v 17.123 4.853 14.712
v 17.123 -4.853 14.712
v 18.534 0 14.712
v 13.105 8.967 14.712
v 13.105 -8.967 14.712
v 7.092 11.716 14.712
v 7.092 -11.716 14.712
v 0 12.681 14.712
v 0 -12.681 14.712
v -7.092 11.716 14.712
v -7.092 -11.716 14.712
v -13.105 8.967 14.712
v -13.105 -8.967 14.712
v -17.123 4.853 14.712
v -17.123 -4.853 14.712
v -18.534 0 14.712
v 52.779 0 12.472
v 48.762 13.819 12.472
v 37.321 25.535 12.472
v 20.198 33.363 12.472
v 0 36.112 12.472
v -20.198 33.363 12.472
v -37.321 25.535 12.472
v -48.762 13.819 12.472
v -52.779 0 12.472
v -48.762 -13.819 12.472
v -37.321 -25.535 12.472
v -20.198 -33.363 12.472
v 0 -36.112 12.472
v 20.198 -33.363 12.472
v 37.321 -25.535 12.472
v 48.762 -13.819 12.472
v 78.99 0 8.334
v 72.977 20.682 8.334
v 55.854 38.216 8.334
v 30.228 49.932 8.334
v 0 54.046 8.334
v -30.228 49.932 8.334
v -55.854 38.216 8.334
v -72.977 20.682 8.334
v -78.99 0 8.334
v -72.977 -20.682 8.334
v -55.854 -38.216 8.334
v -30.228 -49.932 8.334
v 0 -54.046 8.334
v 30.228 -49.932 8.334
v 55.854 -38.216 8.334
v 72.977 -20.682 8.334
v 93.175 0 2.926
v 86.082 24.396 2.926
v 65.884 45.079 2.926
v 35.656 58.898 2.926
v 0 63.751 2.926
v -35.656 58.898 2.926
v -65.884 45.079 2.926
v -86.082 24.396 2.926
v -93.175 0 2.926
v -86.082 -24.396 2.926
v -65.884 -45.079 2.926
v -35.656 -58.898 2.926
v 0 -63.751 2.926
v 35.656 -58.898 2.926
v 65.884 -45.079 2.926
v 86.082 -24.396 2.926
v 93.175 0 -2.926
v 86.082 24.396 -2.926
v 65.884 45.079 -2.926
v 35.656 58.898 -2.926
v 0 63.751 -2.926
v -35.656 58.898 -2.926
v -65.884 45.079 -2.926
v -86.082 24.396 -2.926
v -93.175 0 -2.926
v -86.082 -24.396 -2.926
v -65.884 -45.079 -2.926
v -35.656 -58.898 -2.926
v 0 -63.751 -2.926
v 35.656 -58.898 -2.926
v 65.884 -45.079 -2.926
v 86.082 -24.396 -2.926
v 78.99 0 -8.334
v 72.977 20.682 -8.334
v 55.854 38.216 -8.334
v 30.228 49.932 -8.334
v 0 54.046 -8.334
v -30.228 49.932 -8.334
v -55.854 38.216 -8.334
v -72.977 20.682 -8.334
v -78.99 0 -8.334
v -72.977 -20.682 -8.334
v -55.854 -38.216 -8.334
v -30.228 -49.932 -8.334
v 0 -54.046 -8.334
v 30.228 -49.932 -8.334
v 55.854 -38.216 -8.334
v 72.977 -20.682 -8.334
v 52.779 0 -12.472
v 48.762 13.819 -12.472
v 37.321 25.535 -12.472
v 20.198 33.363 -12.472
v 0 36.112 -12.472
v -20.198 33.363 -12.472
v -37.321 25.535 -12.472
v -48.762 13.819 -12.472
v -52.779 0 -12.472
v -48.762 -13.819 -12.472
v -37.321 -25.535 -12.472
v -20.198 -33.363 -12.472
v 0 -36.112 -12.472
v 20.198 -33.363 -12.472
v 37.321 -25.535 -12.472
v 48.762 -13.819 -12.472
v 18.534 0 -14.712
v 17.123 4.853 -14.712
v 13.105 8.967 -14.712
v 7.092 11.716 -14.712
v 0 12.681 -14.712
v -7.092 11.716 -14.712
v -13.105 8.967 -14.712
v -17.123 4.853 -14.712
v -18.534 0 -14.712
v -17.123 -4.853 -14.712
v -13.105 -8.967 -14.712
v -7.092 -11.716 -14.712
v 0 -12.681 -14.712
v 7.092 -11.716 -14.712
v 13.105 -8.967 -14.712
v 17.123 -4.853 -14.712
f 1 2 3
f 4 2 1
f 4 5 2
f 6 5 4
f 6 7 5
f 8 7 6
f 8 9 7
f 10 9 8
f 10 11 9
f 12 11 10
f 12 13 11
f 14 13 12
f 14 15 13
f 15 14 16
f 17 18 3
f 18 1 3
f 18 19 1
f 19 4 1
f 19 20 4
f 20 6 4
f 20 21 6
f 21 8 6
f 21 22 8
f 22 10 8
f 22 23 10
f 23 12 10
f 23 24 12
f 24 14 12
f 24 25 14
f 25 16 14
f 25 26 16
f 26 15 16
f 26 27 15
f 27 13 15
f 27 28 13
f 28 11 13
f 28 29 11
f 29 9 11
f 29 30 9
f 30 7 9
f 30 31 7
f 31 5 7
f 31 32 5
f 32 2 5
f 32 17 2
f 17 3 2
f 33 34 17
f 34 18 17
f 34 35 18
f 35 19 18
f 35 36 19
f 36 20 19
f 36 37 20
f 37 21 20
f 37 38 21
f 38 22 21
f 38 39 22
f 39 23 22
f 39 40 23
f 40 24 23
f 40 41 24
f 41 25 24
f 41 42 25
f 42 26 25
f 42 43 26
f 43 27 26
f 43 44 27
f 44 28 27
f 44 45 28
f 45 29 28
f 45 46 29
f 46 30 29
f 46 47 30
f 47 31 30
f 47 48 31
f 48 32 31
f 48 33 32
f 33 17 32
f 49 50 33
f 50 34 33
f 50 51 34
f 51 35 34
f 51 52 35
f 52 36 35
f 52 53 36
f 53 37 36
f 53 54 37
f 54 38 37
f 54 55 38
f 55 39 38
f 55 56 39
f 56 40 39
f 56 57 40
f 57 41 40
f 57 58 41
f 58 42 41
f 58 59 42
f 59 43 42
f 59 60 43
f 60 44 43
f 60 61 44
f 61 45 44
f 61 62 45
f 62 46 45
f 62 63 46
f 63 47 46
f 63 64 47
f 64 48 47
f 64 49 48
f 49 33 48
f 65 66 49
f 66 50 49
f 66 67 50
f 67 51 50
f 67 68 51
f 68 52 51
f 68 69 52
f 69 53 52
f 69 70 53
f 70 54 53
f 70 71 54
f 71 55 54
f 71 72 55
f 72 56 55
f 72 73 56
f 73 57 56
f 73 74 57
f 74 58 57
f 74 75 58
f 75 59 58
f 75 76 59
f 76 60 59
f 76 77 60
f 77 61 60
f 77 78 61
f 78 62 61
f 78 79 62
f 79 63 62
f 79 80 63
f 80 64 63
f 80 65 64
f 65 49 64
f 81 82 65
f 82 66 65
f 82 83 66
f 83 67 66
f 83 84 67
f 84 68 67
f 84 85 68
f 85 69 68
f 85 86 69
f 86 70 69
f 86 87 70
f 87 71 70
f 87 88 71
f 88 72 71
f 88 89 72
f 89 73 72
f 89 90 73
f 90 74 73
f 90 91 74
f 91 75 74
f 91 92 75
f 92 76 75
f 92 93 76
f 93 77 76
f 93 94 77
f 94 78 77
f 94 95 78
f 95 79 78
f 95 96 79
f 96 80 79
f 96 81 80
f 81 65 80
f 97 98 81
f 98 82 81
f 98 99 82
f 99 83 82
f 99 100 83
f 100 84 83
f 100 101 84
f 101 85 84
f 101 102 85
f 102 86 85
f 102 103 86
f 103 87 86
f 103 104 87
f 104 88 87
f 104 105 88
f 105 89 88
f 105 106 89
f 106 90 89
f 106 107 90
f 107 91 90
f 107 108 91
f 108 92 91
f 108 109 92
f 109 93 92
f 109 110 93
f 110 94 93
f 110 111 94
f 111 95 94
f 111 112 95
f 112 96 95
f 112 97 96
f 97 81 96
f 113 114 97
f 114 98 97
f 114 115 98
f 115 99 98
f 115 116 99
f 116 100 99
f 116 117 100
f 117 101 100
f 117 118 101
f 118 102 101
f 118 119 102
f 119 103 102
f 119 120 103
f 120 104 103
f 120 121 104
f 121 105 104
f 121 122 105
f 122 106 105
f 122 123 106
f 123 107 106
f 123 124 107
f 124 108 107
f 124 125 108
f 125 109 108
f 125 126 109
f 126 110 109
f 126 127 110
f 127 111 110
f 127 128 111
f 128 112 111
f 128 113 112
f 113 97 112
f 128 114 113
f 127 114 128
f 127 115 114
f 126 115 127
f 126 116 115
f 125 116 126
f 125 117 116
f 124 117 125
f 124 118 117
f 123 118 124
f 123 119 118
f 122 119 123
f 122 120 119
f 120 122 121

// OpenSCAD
// Generated by SolidPython 1.0.1 on 2020-07-29 00:46:54


scale(v = [19, 13, 3]) {
	sphere(r = 5);
}
/***********************************************
*********      SolidPython code:      **********
************************************************
 
# import packages: SolidPython
from solid import *
from solid.utils import *
from itertools import chain, combinations, permutations


class Resize:

    def __init__(self, scad_file):
        self.scad_file = scad_file
        #self.scad_file = import_scad(scad_file)
        # cone/cylinder param:
        self.r1 = 0
        self.r2 = 0
        self.h = 0
        # rectangular prism param:
        self.w = 0
        self.l = 0
        # ellipse param:
        self.r = 0

    # import OpenScad code (file name corresponds to shape)


    # classify shape + parameters
    def assign(self, param1, param2, param3):
        if self.scad_file == 'cone.scad':
            self.r1 = param1
            self.r2 = param2
            self.h = param3
        elif self.scad_file == 'cylinder.scad':
            self.r1 = param1
            self.r2 = param2
            self.h = param3
        elif self.scad_file == 'rectangularPrism.scad':
            self.h = param1
            self.l = param2
            self.w = param3
        else:
            self.r = param1
            self.h = param2

    # resize parameters
    def iterate(self):
        x = range(3, 20, 2)
        i = 1
        if self.scad_file == 'cone.scad':
            tempList = list(permutations(x, 2))
            for temp in tempList:
                param1 = temp[0]
                param2 = temp[1]
                filepath = 'produced_scad_files/' + 'cone' + str(param1) + '_' + str(param2) + '_' + '.scad'
                scad_render_to_file(cylinder(h=param1, r1=param2, r2=0), filepath)

        elif self.scad_file == 'cylinder.scad':
            tempList = list(permutations(x, 3))
            for temp in tempList:
                param1 = temp[0]
                param2 = temp[1]
                filepath = 'produced_scad_files/' + 'cylinder' + str(param1) + '_' + str(param2) + '_' + '.scad'
                scad_render_to_file(cylinder(h=param1, r1=param2, r2=param2), filepath)

        elif self.scad_file == 'rectangularPrism.scad':
            tempList = list(permutations(x, 3))
            for temp in tempList:
                param1 = temp[0]
                param2 = temp[1]
                param3 = temp[2]
                filepath = 'produced_scad_files/' + 'rectangularPrism' + str(param1) + '_' + str(param2) + '_' + str(
                    param3) + '.scad'
                scad_render_to_file(cube(size=(param1, param2, param3)), filepath)

        elif self.scad_file == 'ellipse.scad':
            tempList = list(permutations(x, 4))
            for temp in tempList:
                param1 = temp[0]
                param2 = temp[1]
                param3 = temp[2]
                param4 = temp[3]
                filepath = 'produced_scad_files/' + 'ellipse' + str(param1) + '_' + str(param2) + '_' + str(param3) + '_' + str(param4) + '.scad'
                scad_render_to_file(scale([param1, param2, param3])(sphere(r=param4)), filepath)

    def render_to_scadfile(self):
        scad_render_to_file(scad, 'example.scad') 
 
************************************************/
